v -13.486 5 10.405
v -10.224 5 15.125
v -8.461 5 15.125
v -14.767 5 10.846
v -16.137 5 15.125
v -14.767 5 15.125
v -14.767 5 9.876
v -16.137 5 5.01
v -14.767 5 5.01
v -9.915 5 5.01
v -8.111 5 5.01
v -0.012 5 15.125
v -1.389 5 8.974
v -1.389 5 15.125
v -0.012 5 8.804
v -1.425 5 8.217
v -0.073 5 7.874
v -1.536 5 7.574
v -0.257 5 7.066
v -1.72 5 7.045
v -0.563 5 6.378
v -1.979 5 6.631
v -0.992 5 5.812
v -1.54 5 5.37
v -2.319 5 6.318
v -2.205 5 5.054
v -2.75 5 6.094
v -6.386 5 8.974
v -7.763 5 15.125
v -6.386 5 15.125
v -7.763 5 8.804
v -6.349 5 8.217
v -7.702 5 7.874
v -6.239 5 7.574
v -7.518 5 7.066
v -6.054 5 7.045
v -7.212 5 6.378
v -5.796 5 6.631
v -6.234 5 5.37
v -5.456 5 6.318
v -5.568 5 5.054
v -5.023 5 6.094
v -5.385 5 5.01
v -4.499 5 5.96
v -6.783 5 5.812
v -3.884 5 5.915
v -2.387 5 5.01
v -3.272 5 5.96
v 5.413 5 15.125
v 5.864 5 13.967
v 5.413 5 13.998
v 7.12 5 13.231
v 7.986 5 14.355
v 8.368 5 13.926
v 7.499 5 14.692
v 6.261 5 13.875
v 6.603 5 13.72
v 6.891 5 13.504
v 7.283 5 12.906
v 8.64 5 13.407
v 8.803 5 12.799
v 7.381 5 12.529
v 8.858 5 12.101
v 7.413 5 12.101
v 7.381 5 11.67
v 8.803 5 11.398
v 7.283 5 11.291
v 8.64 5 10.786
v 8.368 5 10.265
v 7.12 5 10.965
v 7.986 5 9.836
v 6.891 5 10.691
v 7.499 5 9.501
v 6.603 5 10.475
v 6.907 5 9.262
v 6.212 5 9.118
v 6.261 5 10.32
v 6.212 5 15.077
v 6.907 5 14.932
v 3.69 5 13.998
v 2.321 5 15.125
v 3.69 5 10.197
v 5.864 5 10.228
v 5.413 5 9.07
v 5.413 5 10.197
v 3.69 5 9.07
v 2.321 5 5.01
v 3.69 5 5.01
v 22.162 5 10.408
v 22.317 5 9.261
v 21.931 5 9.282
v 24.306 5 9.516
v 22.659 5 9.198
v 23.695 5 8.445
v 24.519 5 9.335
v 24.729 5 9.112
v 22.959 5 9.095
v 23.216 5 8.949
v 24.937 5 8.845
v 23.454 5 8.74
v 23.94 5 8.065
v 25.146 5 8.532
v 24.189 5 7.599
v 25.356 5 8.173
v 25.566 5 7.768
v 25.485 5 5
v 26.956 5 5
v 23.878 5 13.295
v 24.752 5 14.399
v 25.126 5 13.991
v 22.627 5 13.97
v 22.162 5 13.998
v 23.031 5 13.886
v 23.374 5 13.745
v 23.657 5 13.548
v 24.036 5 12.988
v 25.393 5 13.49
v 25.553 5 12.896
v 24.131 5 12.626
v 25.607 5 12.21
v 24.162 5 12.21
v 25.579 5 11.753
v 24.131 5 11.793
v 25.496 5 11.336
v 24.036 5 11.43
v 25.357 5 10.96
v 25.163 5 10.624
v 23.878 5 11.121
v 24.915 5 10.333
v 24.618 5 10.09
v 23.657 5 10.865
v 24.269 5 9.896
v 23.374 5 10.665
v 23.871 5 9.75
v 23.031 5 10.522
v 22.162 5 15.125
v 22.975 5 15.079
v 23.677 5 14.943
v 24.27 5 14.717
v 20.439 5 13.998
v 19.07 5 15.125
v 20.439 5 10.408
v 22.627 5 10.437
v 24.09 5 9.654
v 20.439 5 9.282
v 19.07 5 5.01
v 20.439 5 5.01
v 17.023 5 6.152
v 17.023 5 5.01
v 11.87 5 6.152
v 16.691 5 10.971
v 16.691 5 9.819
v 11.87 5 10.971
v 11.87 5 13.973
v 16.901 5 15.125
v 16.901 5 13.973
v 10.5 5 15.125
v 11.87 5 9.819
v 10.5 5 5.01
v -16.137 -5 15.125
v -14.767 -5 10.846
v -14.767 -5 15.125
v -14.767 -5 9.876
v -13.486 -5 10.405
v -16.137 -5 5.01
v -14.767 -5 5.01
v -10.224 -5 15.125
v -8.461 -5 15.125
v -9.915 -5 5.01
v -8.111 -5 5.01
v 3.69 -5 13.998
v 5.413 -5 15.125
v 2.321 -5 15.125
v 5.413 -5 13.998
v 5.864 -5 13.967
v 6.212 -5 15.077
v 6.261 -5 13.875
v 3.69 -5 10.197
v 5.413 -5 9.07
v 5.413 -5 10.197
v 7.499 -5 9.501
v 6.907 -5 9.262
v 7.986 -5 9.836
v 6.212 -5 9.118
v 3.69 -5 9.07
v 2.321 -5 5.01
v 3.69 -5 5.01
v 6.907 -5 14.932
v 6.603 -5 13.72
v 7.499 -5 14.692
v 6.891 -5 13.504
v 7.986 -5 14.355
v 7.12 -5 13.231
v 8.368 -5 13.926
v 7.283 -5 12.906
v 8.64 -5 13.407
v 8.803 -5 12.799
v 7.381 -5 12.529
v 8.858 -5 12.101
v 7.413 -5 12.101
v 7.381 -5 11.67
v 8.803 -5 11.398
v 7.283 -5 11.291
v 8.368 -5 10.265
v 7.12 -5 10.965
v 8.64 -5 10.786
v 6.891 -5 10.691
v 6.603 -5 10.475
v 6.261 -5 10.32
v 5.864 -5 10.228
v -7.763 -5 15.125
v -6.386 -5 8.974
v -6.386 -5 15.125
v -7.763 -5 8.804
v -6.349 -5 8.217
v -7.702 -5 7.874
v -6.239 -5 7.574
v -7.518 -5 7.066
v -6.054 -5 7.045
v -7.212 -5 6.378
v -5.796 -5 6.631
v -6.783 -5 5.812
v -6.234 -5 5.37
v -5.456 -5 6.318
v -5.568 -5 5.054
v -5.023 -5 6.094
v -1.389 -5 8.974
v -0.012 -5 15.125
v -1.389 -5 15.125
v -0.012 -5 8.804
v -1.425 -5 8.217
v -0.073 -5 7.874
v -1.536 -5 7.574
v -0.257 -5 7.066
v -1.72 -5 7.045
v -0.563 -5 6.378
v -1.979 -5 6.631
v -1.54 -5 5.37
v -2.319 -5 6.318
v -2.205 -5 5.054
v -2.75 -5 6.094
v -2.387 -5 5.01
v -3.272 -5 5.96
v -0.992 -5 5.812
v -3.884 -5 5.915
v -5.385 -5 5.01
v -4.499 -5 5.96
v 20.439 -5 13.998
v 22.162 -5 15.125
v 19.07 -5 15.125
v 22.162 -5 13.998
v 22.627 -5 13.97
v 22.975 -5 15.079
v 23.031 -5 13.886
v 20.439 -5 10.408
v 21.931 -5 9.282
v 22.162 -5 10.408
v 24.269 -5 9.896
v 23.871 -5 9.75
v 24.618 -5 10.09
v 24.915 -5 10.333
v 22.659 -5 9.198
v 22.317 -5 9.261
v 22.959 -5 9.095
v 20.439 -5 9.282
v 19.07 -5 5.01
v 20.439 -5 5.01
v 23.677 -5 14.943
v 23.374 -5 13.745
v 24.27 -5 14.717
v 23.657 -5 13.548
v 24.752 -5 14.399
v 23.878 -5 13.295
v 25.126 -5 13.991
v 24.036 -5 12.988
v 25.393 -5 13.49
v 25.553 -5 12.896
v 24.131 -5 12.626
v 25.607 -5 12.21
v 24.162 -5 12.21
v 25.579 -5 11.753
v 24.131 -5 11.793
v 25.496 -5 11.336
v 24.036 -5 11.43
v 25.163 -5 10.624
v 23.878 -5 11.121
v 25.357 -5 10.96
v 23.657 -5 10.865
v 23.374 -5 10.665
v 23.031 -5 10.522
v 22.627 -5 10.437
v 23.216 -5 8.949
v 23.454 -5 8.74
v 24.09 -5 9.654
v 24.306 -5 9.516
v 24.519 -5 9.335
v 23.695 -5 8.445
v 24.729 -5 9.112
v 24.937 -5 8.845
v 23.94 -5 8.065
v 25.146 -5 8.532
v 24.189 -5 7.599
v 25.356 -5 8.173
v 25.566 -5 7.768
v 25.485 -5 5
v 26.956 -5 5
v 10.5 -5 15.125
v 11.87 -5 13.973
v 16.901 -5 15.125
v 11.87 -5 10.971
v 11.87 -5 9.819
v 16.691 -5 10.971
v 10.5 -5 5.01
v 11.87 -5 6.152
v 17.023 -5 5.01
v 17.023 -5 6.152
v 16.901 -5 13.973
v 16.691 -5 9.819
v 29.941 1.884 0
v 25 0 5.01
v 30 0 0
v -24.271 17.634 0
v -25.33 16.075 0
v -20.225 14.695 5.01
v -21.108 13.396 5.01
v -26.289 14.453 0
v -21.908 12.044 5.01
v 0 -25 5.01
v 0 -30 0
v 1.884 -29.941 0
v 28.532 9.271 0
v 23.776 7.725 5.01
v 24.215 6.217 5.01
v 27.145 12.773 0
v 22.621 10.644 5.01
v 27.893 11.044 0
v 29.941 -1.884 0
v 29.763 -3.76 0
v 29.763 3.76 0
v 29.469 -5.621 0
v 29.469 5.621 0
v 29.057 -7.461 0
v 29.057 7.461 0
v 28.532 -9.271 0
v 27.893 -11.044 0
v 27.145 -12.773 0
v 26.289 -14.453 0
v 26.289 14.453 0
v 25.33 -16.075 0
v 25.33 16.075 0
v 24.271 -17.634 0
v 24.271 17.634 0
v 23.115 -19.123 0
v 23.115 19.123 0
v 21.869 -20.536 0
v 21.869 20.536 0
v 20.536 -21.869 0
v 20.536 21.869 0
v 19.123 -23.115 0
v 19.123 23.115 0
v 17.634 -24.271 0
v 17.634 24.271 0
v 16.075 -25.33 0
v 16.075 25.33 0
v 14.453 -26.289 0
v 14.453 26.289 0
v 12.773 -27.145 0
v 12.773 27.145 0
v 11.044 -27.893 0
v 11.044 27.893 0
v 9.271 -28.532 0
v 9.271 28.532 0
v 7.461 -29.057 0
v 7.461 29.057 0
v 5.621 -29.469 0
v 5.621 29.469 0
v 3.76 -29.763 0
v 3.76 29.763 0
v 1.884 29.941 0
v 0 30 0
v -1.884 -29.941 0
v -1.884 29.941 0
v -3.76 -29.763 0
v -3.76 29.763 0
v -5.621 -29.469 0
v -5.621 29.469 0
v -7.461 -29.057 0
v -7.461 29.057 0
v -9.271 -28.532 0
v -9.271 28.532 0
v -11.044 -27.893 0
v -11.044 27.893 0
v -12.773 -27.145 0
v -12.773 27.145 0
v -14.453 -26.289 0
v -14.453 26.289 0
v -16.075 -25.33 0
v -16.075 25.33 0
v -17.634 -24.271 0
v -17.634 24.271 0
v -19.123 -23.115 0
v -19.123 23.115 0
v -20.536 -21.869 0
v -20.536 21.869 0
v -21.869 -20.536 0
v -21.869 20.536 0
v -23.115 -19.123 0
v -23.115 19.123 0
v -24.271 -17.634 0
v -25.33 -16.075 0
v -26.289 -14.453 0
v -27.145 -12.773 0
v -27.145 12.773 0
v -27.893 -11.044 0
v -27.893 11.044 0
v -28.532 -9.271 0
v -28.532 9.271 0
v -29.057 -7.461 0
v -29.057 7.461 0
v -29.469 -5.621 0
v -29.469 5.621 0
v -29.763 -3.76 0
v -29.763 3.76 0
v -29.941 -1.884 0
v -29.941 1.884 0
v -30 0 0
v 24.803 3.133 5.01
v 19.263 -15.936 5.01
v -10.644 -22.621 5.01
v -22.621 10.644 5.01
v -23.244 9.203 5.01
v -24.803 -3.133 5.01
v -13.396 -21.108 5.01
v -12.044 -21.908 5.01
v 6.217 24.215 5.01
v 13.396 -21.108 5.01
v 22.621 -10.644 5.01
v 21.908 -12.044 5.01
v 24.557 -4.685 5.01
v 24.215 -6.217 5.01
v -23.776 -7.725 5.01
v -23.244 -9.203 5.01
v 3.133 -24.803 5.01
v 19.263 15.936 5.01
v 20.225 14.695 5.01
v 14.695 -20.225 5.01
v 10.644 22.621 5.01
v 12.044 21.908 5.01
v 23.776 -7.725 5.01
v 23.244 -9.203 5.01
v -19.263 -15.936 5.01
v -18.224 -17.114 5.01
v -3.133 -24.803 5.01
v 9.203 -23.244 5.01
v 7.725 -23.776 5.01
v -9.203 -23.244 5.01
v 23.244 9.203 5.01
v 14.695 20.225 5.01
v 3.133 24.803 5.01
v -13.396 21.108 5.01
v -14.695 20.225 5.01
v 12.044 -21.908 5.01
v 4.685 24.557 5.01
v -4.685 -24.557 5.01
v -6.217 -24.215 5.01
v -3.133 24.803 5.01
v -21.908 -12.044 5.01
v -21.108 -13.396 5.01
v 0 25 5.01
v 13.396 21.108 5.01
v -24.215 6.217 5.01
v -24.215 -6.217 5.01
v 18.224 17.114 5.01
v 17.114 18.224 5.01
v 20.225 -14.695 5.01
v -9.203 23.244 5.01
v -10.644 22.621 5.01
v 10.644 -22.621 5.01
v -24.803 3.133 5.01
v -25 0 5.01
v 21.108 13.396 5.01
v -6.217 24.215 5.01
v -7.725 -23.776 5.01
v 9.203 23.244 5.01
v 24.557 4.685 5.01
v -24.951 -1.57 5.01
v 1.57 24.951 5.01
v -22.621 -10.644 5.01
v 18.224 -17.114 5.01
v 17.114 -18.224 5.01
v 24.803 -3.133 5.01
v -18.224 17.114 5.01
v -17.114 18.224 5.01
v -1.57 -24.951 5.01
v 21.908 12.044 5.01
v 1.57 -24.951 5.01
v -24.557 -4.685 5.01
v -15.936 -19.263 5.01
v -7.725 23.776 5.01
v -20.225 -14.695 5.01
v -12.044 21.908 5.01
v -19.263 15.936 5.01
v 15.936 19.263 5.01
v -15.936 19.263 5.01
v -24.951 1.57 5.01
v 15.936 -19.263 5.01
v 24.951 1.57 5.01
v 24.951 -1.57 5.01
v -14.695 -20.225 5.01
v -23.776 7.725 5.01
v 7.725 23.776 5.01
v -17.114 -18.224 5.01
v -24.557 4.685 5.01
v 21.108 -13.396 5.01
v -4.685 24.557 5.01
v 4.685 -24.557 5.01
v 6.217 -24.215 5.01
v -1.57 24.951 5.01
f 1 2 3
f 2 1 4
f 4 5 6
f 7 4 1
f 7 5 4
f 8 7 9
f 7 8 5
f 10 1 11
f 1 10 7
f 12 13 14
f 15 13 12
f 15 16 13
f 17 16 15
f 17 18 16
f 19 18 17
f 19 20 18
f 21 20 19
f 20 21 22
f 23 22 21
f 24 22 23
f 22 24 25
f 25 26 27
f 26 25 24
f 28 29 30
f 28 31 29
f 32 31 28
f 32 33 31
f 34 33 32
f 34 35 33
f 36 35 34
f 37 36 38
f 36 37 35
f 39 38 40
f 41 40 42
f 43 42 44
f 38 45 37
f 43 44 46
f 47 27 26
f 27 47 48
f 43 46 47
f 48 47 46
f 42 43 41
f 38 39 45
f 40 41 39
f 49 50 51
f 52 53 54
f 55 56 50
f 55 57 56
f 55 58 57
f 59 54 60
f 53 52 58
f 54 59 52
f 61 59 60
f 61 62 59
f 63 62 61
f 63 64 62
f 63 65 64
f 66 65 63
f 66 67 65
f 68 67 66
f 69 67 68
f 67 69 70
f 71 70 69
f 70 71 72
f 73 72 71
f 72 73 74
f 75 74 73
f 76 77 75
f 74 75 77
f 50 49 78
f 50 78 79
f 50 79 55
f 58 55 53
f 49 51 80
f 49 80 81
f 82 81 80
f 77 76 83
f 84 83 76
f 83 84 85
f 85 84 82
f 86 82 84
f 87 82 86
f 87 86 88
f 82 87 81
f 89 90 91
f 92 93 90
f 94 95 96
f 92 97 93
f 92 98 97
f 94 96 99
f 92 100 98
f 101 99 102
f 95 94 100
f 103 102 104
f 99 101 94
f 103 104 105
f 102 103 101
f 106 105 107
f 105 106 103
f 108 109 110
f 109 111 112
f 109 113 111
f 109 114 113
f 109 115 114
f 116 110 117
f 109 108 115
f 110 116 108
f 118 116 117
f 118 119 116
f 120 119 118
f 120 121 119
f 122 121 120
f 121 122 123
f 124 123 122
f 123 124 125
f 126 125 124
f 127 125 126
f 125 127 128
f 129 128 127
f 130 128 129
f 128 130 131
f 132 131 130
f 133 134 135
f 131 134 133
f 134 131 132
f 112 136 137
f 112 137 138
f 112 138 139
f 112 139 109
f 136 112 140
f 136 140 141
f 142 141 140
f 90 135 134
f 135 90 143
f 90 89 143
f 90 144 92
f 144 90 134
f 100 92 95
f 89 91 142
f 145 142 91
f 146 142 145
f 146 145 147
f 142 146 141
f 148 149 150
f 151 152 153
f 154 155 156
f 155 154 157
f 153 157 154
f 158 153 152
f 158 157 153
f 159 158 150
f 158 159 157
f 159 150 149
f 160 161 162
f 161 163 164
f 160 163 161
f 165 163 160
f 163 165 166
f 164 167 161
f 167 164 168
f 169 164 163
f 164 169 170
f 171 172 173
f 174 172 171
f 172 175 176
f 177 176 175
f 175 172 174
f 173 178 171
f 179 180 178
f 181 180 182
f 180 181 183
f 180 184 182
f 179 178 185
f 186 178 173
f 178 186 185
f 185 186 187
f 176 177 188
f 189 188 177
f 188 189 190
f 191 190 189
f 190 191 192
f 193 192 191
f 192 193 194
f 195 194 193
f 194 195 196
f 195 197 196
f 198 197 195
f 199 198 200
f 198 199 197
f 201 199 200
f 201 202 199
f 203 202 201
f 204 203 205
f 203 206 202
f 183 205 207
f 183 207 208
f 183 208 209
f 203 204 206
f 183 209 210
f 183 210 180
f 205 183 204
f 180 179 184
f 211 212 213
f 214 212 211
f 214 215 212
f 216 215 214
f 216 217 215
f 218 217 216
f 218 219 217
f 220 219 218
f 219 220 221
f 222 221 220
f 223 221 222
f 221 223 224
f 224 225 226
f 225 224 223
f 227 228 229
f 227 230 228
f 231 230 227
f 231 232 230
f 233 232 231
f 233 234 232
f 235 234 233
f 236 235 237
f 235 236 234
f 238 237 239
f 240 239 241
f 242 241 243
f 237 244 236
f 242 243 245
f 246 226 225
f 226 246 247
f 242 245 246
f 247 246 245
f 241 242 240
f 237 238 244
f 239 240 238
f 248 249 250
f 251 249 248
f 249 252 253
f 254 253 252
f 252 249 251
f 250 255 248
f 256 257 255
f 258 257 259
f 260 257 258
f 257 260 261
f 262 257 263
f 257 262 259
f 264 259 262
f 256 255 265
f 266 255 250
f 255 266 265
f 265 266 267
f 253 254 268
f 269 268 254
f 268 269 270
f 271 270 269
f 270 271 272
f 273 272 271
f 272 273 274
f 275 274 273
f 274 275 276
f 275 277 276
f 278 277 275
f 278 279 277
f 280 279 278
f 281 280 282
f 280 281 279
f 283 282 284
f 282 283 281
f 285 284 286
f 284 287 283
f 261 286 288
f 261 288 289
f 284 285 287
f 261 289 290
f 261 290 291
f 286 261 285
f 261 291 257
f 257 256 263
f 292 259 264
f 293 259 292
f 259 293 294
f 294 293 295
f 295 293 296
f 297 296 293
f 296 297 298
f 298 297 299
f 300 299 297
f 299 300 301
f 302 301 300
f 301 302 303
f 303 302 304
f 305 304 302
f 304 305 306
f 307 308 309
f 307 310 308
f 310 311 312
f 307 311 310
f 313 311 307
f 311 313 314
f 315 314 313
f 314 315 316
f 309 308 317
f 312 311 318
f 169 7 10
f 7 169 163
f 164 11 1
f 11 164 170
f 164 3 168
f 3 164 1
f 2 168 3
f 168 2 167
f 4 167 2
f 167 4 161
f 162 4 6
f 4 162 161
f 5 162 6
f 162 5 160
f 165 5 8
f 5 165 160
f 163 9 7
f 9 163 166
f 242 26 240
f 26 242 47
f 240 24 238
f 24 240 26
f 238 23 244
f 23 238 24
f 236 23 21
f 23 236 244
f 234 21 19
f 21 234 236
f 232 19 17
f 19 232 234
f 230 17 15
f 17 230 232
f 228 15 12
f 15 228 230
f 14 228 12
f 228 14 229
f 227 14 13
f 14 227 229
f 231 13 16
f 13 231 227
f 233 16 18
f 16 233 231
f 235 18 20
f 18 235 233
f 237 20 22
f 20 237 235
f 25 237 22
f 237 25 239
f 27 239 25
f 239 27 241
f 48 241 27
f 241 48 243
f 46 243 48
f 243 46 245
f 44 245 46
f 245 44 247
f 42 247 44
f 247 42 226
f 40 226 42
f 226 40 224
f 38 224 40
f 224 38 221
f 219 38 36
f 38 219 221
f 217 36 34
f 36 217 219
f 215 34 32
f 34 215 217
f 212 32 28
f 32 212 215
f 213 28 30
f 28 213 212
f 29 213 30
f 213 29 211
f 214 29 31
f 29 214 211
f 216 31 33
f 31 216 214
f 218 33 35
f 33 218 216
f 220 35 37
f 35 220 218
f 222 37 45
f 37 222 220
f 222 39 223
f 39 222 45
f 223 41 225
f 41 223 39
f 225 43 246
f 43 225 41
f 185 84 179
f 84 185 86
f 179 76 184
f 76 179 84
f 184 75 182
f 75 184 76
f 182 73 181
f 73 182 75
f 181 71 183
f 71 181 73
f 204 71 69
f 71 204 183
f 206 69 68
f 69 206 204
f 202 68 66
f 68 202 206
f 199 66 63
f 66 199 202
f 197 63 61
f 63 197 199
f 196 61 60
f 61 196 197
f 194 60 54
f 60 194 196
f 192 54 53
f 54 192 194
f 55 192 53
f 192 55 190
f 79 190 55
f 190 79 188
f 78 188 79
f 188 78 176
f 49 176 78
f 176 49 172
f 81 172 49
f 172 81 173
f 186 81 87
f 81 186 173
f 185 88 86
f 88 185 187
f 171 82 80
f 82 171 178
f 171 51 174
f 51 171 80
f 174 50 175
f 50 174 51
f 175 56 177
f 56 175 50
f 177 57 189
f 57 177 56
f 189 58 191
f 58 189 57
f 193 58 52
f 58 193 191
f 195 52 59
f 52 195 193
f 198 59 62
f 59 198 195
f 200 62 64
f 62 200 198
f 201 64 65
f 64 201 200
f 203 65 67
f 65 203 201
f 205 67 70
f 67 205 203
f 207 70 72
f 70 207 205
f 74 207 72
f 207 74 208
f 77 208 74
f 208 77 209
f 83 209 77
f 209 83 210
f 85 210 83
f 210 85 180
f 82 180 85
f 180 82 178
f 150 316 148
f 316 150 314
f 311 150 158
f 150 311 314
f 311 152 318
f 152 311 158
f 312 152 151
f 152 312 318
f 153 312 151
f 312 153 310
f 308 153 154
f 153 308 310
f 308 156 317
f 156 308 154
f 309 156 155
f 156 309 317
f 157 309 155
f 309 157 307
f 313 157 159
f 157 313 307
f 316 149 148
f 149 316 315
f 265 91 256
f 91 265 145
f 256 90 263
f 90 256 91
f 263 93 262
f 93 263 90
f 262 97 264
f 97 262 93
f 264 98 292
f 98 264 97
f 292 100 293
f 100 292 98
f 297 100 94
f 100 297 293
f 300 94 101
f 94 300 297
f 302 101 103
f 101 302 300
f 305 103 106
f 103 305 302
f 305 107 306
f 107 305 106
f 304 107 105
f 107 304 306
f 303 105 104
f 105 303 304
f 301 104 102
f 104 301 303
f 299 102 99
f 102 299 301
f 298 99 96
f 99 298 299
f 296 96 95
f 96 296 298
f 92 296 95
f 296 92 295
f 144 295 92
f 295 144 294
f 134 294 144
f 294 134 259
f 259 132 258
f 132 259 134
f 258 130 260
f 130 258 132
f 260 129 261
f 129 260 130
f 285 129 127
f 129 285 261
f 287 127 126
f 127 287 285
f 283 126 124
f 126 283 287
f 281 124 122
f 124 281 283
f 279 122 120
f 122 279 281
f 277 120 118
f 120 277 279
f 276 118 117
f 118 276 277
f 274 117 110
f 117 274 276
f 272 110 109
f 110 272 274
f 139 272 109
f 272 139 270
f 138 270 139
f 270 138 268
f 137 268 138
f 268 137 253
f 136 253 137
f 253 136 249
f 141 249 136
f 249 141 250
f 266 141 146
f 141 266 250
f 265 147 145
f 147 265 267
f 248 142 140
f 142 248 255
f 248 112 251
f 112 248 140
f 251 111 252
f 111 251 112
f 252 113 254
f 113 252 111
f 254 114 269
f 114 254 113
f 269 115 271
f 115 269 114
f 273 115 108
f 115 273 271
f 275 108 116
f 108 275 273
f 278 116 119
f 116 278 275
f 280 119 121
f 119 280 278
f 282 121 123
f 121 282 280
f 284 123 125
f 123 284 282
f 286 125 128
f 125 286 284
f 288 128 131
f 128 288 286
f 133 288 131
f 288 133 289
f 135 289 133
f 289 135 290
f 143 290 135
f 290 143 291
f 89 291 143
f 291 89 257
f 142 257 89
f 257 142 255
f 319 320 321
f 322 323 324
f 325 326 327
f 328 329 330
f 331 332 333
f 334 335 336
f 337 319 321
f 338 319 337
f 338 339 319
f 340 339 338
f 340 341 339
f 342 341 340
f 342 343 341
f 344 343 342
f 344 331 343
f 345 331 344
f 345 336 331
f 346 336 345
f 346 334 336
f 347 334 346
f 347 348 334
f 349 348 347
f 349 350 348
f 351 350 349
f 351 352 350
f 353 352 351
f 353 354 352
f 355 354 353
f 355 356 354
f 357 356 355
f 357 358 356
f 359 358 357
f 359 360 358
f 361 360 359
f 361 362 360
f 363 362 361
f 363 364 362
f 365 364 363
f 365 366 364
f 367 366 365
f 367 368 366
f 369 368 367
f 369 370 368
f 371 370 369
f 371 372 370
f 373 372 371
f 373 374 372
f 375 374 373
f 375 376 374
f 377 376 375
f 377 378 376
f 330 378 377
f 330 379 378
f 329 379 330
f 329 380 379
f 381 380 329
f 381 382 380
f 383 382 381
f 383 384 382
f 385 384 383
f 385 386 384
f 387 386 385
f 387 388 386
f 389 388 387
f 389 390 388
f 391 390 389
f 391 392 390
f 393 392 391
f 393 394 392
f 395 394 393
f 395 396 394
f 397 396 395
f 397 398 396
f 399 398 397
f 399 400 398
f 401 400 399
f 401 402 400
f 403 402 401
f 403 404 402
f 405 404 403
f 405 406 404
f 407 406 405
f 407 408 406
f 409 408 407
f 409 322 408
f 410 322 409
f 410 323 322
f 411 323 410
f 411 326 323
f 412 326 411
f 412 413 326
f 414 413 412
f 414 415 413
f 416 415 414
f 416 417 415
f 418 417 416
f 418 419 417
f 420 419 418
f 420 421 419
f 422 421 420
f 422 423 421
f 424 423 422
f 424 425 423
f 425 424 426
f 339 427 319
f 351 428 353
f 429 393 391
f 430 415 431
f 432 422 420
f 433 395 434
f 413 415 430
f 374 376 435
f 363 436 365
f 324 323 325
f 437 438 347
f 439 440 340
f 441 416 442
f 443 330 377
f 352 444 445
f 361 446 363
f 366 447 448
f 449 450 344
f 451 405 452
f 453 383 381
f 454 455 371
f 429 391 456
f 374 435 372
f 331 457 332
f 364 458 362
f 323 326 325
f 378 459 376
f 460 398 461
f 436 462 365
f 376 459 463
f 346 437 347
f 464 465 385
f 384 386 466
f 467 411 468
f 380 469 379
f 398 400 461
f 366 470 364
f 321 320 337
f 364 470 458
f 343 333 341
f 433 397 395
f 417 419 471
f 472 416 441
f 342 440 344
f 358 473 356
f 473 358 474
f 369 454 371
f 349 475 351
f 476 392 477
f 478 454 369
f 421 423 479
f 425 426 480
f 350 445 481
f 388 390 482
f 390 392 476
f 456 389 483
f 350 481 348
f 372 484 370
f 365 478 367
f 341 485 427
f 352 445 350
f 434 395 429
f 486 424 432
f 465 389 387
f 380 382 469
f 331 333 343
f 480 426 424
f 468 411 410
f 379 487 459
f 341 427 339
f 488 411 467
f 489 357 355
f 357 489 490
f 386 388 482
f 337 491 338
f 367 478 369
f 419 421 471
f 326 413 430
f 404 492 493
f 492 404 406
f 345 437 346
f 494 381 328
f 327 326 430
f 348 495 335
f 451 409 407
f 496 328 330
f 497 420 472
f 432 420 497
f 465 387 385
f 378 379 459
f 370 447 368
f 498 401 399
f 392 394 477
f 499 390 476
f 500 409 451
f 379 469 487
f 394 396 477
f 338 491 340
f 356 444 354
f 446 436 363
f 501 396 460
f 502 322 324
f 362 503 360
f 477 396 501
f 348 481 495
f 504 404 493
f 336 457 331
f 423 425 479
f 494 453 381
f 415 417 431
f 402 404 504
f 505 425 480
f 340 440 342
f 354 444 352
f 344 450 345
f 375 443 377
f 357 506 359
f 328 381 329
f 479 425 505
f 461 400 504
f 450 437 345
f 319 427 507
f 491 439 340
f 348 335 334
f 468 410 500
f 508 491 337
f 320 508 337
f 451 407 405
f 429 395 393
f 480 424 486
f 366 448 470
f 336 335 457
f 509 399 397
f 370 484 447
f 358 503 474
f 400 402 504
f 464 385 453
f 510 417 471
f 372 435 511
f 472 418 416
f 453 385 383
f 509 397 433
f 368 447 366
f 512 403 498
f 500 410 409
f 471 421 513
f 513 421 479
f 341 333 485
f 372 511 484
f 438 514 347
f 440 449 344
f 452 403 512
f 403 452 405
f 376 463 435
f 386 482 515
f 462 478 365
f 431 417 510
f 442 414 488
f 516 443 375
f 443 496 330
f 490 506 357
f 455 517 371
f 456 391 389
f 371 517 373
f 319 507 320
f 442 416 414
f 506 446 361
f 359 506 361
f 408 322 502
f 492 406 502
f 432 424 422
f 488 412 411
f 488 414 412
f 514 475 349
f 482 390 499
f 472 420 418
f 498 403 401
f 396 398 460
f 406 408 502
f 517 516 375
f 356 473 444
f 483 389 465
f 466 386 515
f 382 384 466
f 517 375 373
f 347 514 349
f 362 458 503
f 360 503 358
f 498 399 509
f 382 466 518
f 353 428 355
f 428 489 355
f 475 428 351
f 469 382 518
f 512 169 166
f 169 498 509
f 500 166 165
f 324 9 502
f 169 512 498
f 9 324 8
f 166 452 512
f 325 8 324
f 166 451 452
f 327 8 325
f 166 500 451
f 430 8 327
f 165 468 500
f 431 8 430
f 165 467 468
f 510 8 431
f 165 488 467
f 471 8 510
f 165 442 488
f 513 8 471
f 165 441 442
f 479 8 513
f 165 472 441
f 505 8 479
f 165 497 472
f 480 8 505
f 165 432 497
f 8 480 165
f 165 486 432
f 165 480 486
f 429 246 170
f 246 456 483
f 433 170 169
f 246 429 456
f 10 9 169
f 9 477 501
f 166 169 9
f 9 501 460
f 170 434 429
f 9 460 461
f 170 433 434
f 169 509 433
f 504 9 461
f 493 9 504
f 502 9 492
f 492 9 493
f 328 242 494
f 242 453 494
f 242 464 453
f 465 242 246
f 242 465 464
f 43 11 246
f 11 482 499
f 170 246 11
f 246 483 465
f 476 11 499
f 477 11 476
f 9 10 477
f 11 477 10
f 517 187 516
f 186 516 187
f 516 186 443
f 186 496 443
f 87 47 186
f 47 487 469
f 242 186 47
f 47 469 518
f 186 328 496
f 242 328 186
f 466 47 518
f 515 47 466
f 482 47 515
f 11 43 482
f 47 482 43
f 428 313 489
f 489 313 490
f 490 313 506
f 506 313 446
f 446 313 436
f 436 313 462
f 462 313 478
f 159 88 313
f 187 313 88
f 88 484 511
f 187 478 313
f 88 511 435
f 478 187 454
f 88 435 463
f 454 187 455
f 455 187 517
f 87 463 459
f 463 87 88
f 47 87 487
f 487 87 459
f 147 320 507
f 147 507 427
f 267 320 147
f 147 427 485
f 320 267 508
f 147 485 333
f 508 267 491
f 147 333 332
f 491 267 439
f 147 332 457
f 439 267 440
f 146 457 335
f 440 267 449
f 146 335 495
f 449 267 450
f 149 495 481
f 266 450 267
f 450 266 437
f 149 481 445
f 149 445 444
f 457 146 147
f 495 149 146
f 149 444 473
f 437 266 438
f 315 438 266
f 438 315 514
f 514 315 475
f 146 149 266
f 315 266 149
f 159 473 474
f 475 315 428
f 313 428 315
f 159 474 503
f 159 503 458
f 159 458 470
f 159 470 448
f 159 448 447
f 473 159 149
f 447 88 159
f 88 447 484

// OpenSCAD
union() {

translate([-17.5,5,5])
rotate([90,0,0])
linear_extrude(10)
    text("KUPER", font="Impact");
    
cylinder(5.01,30,25, $fn=100);
    
}
